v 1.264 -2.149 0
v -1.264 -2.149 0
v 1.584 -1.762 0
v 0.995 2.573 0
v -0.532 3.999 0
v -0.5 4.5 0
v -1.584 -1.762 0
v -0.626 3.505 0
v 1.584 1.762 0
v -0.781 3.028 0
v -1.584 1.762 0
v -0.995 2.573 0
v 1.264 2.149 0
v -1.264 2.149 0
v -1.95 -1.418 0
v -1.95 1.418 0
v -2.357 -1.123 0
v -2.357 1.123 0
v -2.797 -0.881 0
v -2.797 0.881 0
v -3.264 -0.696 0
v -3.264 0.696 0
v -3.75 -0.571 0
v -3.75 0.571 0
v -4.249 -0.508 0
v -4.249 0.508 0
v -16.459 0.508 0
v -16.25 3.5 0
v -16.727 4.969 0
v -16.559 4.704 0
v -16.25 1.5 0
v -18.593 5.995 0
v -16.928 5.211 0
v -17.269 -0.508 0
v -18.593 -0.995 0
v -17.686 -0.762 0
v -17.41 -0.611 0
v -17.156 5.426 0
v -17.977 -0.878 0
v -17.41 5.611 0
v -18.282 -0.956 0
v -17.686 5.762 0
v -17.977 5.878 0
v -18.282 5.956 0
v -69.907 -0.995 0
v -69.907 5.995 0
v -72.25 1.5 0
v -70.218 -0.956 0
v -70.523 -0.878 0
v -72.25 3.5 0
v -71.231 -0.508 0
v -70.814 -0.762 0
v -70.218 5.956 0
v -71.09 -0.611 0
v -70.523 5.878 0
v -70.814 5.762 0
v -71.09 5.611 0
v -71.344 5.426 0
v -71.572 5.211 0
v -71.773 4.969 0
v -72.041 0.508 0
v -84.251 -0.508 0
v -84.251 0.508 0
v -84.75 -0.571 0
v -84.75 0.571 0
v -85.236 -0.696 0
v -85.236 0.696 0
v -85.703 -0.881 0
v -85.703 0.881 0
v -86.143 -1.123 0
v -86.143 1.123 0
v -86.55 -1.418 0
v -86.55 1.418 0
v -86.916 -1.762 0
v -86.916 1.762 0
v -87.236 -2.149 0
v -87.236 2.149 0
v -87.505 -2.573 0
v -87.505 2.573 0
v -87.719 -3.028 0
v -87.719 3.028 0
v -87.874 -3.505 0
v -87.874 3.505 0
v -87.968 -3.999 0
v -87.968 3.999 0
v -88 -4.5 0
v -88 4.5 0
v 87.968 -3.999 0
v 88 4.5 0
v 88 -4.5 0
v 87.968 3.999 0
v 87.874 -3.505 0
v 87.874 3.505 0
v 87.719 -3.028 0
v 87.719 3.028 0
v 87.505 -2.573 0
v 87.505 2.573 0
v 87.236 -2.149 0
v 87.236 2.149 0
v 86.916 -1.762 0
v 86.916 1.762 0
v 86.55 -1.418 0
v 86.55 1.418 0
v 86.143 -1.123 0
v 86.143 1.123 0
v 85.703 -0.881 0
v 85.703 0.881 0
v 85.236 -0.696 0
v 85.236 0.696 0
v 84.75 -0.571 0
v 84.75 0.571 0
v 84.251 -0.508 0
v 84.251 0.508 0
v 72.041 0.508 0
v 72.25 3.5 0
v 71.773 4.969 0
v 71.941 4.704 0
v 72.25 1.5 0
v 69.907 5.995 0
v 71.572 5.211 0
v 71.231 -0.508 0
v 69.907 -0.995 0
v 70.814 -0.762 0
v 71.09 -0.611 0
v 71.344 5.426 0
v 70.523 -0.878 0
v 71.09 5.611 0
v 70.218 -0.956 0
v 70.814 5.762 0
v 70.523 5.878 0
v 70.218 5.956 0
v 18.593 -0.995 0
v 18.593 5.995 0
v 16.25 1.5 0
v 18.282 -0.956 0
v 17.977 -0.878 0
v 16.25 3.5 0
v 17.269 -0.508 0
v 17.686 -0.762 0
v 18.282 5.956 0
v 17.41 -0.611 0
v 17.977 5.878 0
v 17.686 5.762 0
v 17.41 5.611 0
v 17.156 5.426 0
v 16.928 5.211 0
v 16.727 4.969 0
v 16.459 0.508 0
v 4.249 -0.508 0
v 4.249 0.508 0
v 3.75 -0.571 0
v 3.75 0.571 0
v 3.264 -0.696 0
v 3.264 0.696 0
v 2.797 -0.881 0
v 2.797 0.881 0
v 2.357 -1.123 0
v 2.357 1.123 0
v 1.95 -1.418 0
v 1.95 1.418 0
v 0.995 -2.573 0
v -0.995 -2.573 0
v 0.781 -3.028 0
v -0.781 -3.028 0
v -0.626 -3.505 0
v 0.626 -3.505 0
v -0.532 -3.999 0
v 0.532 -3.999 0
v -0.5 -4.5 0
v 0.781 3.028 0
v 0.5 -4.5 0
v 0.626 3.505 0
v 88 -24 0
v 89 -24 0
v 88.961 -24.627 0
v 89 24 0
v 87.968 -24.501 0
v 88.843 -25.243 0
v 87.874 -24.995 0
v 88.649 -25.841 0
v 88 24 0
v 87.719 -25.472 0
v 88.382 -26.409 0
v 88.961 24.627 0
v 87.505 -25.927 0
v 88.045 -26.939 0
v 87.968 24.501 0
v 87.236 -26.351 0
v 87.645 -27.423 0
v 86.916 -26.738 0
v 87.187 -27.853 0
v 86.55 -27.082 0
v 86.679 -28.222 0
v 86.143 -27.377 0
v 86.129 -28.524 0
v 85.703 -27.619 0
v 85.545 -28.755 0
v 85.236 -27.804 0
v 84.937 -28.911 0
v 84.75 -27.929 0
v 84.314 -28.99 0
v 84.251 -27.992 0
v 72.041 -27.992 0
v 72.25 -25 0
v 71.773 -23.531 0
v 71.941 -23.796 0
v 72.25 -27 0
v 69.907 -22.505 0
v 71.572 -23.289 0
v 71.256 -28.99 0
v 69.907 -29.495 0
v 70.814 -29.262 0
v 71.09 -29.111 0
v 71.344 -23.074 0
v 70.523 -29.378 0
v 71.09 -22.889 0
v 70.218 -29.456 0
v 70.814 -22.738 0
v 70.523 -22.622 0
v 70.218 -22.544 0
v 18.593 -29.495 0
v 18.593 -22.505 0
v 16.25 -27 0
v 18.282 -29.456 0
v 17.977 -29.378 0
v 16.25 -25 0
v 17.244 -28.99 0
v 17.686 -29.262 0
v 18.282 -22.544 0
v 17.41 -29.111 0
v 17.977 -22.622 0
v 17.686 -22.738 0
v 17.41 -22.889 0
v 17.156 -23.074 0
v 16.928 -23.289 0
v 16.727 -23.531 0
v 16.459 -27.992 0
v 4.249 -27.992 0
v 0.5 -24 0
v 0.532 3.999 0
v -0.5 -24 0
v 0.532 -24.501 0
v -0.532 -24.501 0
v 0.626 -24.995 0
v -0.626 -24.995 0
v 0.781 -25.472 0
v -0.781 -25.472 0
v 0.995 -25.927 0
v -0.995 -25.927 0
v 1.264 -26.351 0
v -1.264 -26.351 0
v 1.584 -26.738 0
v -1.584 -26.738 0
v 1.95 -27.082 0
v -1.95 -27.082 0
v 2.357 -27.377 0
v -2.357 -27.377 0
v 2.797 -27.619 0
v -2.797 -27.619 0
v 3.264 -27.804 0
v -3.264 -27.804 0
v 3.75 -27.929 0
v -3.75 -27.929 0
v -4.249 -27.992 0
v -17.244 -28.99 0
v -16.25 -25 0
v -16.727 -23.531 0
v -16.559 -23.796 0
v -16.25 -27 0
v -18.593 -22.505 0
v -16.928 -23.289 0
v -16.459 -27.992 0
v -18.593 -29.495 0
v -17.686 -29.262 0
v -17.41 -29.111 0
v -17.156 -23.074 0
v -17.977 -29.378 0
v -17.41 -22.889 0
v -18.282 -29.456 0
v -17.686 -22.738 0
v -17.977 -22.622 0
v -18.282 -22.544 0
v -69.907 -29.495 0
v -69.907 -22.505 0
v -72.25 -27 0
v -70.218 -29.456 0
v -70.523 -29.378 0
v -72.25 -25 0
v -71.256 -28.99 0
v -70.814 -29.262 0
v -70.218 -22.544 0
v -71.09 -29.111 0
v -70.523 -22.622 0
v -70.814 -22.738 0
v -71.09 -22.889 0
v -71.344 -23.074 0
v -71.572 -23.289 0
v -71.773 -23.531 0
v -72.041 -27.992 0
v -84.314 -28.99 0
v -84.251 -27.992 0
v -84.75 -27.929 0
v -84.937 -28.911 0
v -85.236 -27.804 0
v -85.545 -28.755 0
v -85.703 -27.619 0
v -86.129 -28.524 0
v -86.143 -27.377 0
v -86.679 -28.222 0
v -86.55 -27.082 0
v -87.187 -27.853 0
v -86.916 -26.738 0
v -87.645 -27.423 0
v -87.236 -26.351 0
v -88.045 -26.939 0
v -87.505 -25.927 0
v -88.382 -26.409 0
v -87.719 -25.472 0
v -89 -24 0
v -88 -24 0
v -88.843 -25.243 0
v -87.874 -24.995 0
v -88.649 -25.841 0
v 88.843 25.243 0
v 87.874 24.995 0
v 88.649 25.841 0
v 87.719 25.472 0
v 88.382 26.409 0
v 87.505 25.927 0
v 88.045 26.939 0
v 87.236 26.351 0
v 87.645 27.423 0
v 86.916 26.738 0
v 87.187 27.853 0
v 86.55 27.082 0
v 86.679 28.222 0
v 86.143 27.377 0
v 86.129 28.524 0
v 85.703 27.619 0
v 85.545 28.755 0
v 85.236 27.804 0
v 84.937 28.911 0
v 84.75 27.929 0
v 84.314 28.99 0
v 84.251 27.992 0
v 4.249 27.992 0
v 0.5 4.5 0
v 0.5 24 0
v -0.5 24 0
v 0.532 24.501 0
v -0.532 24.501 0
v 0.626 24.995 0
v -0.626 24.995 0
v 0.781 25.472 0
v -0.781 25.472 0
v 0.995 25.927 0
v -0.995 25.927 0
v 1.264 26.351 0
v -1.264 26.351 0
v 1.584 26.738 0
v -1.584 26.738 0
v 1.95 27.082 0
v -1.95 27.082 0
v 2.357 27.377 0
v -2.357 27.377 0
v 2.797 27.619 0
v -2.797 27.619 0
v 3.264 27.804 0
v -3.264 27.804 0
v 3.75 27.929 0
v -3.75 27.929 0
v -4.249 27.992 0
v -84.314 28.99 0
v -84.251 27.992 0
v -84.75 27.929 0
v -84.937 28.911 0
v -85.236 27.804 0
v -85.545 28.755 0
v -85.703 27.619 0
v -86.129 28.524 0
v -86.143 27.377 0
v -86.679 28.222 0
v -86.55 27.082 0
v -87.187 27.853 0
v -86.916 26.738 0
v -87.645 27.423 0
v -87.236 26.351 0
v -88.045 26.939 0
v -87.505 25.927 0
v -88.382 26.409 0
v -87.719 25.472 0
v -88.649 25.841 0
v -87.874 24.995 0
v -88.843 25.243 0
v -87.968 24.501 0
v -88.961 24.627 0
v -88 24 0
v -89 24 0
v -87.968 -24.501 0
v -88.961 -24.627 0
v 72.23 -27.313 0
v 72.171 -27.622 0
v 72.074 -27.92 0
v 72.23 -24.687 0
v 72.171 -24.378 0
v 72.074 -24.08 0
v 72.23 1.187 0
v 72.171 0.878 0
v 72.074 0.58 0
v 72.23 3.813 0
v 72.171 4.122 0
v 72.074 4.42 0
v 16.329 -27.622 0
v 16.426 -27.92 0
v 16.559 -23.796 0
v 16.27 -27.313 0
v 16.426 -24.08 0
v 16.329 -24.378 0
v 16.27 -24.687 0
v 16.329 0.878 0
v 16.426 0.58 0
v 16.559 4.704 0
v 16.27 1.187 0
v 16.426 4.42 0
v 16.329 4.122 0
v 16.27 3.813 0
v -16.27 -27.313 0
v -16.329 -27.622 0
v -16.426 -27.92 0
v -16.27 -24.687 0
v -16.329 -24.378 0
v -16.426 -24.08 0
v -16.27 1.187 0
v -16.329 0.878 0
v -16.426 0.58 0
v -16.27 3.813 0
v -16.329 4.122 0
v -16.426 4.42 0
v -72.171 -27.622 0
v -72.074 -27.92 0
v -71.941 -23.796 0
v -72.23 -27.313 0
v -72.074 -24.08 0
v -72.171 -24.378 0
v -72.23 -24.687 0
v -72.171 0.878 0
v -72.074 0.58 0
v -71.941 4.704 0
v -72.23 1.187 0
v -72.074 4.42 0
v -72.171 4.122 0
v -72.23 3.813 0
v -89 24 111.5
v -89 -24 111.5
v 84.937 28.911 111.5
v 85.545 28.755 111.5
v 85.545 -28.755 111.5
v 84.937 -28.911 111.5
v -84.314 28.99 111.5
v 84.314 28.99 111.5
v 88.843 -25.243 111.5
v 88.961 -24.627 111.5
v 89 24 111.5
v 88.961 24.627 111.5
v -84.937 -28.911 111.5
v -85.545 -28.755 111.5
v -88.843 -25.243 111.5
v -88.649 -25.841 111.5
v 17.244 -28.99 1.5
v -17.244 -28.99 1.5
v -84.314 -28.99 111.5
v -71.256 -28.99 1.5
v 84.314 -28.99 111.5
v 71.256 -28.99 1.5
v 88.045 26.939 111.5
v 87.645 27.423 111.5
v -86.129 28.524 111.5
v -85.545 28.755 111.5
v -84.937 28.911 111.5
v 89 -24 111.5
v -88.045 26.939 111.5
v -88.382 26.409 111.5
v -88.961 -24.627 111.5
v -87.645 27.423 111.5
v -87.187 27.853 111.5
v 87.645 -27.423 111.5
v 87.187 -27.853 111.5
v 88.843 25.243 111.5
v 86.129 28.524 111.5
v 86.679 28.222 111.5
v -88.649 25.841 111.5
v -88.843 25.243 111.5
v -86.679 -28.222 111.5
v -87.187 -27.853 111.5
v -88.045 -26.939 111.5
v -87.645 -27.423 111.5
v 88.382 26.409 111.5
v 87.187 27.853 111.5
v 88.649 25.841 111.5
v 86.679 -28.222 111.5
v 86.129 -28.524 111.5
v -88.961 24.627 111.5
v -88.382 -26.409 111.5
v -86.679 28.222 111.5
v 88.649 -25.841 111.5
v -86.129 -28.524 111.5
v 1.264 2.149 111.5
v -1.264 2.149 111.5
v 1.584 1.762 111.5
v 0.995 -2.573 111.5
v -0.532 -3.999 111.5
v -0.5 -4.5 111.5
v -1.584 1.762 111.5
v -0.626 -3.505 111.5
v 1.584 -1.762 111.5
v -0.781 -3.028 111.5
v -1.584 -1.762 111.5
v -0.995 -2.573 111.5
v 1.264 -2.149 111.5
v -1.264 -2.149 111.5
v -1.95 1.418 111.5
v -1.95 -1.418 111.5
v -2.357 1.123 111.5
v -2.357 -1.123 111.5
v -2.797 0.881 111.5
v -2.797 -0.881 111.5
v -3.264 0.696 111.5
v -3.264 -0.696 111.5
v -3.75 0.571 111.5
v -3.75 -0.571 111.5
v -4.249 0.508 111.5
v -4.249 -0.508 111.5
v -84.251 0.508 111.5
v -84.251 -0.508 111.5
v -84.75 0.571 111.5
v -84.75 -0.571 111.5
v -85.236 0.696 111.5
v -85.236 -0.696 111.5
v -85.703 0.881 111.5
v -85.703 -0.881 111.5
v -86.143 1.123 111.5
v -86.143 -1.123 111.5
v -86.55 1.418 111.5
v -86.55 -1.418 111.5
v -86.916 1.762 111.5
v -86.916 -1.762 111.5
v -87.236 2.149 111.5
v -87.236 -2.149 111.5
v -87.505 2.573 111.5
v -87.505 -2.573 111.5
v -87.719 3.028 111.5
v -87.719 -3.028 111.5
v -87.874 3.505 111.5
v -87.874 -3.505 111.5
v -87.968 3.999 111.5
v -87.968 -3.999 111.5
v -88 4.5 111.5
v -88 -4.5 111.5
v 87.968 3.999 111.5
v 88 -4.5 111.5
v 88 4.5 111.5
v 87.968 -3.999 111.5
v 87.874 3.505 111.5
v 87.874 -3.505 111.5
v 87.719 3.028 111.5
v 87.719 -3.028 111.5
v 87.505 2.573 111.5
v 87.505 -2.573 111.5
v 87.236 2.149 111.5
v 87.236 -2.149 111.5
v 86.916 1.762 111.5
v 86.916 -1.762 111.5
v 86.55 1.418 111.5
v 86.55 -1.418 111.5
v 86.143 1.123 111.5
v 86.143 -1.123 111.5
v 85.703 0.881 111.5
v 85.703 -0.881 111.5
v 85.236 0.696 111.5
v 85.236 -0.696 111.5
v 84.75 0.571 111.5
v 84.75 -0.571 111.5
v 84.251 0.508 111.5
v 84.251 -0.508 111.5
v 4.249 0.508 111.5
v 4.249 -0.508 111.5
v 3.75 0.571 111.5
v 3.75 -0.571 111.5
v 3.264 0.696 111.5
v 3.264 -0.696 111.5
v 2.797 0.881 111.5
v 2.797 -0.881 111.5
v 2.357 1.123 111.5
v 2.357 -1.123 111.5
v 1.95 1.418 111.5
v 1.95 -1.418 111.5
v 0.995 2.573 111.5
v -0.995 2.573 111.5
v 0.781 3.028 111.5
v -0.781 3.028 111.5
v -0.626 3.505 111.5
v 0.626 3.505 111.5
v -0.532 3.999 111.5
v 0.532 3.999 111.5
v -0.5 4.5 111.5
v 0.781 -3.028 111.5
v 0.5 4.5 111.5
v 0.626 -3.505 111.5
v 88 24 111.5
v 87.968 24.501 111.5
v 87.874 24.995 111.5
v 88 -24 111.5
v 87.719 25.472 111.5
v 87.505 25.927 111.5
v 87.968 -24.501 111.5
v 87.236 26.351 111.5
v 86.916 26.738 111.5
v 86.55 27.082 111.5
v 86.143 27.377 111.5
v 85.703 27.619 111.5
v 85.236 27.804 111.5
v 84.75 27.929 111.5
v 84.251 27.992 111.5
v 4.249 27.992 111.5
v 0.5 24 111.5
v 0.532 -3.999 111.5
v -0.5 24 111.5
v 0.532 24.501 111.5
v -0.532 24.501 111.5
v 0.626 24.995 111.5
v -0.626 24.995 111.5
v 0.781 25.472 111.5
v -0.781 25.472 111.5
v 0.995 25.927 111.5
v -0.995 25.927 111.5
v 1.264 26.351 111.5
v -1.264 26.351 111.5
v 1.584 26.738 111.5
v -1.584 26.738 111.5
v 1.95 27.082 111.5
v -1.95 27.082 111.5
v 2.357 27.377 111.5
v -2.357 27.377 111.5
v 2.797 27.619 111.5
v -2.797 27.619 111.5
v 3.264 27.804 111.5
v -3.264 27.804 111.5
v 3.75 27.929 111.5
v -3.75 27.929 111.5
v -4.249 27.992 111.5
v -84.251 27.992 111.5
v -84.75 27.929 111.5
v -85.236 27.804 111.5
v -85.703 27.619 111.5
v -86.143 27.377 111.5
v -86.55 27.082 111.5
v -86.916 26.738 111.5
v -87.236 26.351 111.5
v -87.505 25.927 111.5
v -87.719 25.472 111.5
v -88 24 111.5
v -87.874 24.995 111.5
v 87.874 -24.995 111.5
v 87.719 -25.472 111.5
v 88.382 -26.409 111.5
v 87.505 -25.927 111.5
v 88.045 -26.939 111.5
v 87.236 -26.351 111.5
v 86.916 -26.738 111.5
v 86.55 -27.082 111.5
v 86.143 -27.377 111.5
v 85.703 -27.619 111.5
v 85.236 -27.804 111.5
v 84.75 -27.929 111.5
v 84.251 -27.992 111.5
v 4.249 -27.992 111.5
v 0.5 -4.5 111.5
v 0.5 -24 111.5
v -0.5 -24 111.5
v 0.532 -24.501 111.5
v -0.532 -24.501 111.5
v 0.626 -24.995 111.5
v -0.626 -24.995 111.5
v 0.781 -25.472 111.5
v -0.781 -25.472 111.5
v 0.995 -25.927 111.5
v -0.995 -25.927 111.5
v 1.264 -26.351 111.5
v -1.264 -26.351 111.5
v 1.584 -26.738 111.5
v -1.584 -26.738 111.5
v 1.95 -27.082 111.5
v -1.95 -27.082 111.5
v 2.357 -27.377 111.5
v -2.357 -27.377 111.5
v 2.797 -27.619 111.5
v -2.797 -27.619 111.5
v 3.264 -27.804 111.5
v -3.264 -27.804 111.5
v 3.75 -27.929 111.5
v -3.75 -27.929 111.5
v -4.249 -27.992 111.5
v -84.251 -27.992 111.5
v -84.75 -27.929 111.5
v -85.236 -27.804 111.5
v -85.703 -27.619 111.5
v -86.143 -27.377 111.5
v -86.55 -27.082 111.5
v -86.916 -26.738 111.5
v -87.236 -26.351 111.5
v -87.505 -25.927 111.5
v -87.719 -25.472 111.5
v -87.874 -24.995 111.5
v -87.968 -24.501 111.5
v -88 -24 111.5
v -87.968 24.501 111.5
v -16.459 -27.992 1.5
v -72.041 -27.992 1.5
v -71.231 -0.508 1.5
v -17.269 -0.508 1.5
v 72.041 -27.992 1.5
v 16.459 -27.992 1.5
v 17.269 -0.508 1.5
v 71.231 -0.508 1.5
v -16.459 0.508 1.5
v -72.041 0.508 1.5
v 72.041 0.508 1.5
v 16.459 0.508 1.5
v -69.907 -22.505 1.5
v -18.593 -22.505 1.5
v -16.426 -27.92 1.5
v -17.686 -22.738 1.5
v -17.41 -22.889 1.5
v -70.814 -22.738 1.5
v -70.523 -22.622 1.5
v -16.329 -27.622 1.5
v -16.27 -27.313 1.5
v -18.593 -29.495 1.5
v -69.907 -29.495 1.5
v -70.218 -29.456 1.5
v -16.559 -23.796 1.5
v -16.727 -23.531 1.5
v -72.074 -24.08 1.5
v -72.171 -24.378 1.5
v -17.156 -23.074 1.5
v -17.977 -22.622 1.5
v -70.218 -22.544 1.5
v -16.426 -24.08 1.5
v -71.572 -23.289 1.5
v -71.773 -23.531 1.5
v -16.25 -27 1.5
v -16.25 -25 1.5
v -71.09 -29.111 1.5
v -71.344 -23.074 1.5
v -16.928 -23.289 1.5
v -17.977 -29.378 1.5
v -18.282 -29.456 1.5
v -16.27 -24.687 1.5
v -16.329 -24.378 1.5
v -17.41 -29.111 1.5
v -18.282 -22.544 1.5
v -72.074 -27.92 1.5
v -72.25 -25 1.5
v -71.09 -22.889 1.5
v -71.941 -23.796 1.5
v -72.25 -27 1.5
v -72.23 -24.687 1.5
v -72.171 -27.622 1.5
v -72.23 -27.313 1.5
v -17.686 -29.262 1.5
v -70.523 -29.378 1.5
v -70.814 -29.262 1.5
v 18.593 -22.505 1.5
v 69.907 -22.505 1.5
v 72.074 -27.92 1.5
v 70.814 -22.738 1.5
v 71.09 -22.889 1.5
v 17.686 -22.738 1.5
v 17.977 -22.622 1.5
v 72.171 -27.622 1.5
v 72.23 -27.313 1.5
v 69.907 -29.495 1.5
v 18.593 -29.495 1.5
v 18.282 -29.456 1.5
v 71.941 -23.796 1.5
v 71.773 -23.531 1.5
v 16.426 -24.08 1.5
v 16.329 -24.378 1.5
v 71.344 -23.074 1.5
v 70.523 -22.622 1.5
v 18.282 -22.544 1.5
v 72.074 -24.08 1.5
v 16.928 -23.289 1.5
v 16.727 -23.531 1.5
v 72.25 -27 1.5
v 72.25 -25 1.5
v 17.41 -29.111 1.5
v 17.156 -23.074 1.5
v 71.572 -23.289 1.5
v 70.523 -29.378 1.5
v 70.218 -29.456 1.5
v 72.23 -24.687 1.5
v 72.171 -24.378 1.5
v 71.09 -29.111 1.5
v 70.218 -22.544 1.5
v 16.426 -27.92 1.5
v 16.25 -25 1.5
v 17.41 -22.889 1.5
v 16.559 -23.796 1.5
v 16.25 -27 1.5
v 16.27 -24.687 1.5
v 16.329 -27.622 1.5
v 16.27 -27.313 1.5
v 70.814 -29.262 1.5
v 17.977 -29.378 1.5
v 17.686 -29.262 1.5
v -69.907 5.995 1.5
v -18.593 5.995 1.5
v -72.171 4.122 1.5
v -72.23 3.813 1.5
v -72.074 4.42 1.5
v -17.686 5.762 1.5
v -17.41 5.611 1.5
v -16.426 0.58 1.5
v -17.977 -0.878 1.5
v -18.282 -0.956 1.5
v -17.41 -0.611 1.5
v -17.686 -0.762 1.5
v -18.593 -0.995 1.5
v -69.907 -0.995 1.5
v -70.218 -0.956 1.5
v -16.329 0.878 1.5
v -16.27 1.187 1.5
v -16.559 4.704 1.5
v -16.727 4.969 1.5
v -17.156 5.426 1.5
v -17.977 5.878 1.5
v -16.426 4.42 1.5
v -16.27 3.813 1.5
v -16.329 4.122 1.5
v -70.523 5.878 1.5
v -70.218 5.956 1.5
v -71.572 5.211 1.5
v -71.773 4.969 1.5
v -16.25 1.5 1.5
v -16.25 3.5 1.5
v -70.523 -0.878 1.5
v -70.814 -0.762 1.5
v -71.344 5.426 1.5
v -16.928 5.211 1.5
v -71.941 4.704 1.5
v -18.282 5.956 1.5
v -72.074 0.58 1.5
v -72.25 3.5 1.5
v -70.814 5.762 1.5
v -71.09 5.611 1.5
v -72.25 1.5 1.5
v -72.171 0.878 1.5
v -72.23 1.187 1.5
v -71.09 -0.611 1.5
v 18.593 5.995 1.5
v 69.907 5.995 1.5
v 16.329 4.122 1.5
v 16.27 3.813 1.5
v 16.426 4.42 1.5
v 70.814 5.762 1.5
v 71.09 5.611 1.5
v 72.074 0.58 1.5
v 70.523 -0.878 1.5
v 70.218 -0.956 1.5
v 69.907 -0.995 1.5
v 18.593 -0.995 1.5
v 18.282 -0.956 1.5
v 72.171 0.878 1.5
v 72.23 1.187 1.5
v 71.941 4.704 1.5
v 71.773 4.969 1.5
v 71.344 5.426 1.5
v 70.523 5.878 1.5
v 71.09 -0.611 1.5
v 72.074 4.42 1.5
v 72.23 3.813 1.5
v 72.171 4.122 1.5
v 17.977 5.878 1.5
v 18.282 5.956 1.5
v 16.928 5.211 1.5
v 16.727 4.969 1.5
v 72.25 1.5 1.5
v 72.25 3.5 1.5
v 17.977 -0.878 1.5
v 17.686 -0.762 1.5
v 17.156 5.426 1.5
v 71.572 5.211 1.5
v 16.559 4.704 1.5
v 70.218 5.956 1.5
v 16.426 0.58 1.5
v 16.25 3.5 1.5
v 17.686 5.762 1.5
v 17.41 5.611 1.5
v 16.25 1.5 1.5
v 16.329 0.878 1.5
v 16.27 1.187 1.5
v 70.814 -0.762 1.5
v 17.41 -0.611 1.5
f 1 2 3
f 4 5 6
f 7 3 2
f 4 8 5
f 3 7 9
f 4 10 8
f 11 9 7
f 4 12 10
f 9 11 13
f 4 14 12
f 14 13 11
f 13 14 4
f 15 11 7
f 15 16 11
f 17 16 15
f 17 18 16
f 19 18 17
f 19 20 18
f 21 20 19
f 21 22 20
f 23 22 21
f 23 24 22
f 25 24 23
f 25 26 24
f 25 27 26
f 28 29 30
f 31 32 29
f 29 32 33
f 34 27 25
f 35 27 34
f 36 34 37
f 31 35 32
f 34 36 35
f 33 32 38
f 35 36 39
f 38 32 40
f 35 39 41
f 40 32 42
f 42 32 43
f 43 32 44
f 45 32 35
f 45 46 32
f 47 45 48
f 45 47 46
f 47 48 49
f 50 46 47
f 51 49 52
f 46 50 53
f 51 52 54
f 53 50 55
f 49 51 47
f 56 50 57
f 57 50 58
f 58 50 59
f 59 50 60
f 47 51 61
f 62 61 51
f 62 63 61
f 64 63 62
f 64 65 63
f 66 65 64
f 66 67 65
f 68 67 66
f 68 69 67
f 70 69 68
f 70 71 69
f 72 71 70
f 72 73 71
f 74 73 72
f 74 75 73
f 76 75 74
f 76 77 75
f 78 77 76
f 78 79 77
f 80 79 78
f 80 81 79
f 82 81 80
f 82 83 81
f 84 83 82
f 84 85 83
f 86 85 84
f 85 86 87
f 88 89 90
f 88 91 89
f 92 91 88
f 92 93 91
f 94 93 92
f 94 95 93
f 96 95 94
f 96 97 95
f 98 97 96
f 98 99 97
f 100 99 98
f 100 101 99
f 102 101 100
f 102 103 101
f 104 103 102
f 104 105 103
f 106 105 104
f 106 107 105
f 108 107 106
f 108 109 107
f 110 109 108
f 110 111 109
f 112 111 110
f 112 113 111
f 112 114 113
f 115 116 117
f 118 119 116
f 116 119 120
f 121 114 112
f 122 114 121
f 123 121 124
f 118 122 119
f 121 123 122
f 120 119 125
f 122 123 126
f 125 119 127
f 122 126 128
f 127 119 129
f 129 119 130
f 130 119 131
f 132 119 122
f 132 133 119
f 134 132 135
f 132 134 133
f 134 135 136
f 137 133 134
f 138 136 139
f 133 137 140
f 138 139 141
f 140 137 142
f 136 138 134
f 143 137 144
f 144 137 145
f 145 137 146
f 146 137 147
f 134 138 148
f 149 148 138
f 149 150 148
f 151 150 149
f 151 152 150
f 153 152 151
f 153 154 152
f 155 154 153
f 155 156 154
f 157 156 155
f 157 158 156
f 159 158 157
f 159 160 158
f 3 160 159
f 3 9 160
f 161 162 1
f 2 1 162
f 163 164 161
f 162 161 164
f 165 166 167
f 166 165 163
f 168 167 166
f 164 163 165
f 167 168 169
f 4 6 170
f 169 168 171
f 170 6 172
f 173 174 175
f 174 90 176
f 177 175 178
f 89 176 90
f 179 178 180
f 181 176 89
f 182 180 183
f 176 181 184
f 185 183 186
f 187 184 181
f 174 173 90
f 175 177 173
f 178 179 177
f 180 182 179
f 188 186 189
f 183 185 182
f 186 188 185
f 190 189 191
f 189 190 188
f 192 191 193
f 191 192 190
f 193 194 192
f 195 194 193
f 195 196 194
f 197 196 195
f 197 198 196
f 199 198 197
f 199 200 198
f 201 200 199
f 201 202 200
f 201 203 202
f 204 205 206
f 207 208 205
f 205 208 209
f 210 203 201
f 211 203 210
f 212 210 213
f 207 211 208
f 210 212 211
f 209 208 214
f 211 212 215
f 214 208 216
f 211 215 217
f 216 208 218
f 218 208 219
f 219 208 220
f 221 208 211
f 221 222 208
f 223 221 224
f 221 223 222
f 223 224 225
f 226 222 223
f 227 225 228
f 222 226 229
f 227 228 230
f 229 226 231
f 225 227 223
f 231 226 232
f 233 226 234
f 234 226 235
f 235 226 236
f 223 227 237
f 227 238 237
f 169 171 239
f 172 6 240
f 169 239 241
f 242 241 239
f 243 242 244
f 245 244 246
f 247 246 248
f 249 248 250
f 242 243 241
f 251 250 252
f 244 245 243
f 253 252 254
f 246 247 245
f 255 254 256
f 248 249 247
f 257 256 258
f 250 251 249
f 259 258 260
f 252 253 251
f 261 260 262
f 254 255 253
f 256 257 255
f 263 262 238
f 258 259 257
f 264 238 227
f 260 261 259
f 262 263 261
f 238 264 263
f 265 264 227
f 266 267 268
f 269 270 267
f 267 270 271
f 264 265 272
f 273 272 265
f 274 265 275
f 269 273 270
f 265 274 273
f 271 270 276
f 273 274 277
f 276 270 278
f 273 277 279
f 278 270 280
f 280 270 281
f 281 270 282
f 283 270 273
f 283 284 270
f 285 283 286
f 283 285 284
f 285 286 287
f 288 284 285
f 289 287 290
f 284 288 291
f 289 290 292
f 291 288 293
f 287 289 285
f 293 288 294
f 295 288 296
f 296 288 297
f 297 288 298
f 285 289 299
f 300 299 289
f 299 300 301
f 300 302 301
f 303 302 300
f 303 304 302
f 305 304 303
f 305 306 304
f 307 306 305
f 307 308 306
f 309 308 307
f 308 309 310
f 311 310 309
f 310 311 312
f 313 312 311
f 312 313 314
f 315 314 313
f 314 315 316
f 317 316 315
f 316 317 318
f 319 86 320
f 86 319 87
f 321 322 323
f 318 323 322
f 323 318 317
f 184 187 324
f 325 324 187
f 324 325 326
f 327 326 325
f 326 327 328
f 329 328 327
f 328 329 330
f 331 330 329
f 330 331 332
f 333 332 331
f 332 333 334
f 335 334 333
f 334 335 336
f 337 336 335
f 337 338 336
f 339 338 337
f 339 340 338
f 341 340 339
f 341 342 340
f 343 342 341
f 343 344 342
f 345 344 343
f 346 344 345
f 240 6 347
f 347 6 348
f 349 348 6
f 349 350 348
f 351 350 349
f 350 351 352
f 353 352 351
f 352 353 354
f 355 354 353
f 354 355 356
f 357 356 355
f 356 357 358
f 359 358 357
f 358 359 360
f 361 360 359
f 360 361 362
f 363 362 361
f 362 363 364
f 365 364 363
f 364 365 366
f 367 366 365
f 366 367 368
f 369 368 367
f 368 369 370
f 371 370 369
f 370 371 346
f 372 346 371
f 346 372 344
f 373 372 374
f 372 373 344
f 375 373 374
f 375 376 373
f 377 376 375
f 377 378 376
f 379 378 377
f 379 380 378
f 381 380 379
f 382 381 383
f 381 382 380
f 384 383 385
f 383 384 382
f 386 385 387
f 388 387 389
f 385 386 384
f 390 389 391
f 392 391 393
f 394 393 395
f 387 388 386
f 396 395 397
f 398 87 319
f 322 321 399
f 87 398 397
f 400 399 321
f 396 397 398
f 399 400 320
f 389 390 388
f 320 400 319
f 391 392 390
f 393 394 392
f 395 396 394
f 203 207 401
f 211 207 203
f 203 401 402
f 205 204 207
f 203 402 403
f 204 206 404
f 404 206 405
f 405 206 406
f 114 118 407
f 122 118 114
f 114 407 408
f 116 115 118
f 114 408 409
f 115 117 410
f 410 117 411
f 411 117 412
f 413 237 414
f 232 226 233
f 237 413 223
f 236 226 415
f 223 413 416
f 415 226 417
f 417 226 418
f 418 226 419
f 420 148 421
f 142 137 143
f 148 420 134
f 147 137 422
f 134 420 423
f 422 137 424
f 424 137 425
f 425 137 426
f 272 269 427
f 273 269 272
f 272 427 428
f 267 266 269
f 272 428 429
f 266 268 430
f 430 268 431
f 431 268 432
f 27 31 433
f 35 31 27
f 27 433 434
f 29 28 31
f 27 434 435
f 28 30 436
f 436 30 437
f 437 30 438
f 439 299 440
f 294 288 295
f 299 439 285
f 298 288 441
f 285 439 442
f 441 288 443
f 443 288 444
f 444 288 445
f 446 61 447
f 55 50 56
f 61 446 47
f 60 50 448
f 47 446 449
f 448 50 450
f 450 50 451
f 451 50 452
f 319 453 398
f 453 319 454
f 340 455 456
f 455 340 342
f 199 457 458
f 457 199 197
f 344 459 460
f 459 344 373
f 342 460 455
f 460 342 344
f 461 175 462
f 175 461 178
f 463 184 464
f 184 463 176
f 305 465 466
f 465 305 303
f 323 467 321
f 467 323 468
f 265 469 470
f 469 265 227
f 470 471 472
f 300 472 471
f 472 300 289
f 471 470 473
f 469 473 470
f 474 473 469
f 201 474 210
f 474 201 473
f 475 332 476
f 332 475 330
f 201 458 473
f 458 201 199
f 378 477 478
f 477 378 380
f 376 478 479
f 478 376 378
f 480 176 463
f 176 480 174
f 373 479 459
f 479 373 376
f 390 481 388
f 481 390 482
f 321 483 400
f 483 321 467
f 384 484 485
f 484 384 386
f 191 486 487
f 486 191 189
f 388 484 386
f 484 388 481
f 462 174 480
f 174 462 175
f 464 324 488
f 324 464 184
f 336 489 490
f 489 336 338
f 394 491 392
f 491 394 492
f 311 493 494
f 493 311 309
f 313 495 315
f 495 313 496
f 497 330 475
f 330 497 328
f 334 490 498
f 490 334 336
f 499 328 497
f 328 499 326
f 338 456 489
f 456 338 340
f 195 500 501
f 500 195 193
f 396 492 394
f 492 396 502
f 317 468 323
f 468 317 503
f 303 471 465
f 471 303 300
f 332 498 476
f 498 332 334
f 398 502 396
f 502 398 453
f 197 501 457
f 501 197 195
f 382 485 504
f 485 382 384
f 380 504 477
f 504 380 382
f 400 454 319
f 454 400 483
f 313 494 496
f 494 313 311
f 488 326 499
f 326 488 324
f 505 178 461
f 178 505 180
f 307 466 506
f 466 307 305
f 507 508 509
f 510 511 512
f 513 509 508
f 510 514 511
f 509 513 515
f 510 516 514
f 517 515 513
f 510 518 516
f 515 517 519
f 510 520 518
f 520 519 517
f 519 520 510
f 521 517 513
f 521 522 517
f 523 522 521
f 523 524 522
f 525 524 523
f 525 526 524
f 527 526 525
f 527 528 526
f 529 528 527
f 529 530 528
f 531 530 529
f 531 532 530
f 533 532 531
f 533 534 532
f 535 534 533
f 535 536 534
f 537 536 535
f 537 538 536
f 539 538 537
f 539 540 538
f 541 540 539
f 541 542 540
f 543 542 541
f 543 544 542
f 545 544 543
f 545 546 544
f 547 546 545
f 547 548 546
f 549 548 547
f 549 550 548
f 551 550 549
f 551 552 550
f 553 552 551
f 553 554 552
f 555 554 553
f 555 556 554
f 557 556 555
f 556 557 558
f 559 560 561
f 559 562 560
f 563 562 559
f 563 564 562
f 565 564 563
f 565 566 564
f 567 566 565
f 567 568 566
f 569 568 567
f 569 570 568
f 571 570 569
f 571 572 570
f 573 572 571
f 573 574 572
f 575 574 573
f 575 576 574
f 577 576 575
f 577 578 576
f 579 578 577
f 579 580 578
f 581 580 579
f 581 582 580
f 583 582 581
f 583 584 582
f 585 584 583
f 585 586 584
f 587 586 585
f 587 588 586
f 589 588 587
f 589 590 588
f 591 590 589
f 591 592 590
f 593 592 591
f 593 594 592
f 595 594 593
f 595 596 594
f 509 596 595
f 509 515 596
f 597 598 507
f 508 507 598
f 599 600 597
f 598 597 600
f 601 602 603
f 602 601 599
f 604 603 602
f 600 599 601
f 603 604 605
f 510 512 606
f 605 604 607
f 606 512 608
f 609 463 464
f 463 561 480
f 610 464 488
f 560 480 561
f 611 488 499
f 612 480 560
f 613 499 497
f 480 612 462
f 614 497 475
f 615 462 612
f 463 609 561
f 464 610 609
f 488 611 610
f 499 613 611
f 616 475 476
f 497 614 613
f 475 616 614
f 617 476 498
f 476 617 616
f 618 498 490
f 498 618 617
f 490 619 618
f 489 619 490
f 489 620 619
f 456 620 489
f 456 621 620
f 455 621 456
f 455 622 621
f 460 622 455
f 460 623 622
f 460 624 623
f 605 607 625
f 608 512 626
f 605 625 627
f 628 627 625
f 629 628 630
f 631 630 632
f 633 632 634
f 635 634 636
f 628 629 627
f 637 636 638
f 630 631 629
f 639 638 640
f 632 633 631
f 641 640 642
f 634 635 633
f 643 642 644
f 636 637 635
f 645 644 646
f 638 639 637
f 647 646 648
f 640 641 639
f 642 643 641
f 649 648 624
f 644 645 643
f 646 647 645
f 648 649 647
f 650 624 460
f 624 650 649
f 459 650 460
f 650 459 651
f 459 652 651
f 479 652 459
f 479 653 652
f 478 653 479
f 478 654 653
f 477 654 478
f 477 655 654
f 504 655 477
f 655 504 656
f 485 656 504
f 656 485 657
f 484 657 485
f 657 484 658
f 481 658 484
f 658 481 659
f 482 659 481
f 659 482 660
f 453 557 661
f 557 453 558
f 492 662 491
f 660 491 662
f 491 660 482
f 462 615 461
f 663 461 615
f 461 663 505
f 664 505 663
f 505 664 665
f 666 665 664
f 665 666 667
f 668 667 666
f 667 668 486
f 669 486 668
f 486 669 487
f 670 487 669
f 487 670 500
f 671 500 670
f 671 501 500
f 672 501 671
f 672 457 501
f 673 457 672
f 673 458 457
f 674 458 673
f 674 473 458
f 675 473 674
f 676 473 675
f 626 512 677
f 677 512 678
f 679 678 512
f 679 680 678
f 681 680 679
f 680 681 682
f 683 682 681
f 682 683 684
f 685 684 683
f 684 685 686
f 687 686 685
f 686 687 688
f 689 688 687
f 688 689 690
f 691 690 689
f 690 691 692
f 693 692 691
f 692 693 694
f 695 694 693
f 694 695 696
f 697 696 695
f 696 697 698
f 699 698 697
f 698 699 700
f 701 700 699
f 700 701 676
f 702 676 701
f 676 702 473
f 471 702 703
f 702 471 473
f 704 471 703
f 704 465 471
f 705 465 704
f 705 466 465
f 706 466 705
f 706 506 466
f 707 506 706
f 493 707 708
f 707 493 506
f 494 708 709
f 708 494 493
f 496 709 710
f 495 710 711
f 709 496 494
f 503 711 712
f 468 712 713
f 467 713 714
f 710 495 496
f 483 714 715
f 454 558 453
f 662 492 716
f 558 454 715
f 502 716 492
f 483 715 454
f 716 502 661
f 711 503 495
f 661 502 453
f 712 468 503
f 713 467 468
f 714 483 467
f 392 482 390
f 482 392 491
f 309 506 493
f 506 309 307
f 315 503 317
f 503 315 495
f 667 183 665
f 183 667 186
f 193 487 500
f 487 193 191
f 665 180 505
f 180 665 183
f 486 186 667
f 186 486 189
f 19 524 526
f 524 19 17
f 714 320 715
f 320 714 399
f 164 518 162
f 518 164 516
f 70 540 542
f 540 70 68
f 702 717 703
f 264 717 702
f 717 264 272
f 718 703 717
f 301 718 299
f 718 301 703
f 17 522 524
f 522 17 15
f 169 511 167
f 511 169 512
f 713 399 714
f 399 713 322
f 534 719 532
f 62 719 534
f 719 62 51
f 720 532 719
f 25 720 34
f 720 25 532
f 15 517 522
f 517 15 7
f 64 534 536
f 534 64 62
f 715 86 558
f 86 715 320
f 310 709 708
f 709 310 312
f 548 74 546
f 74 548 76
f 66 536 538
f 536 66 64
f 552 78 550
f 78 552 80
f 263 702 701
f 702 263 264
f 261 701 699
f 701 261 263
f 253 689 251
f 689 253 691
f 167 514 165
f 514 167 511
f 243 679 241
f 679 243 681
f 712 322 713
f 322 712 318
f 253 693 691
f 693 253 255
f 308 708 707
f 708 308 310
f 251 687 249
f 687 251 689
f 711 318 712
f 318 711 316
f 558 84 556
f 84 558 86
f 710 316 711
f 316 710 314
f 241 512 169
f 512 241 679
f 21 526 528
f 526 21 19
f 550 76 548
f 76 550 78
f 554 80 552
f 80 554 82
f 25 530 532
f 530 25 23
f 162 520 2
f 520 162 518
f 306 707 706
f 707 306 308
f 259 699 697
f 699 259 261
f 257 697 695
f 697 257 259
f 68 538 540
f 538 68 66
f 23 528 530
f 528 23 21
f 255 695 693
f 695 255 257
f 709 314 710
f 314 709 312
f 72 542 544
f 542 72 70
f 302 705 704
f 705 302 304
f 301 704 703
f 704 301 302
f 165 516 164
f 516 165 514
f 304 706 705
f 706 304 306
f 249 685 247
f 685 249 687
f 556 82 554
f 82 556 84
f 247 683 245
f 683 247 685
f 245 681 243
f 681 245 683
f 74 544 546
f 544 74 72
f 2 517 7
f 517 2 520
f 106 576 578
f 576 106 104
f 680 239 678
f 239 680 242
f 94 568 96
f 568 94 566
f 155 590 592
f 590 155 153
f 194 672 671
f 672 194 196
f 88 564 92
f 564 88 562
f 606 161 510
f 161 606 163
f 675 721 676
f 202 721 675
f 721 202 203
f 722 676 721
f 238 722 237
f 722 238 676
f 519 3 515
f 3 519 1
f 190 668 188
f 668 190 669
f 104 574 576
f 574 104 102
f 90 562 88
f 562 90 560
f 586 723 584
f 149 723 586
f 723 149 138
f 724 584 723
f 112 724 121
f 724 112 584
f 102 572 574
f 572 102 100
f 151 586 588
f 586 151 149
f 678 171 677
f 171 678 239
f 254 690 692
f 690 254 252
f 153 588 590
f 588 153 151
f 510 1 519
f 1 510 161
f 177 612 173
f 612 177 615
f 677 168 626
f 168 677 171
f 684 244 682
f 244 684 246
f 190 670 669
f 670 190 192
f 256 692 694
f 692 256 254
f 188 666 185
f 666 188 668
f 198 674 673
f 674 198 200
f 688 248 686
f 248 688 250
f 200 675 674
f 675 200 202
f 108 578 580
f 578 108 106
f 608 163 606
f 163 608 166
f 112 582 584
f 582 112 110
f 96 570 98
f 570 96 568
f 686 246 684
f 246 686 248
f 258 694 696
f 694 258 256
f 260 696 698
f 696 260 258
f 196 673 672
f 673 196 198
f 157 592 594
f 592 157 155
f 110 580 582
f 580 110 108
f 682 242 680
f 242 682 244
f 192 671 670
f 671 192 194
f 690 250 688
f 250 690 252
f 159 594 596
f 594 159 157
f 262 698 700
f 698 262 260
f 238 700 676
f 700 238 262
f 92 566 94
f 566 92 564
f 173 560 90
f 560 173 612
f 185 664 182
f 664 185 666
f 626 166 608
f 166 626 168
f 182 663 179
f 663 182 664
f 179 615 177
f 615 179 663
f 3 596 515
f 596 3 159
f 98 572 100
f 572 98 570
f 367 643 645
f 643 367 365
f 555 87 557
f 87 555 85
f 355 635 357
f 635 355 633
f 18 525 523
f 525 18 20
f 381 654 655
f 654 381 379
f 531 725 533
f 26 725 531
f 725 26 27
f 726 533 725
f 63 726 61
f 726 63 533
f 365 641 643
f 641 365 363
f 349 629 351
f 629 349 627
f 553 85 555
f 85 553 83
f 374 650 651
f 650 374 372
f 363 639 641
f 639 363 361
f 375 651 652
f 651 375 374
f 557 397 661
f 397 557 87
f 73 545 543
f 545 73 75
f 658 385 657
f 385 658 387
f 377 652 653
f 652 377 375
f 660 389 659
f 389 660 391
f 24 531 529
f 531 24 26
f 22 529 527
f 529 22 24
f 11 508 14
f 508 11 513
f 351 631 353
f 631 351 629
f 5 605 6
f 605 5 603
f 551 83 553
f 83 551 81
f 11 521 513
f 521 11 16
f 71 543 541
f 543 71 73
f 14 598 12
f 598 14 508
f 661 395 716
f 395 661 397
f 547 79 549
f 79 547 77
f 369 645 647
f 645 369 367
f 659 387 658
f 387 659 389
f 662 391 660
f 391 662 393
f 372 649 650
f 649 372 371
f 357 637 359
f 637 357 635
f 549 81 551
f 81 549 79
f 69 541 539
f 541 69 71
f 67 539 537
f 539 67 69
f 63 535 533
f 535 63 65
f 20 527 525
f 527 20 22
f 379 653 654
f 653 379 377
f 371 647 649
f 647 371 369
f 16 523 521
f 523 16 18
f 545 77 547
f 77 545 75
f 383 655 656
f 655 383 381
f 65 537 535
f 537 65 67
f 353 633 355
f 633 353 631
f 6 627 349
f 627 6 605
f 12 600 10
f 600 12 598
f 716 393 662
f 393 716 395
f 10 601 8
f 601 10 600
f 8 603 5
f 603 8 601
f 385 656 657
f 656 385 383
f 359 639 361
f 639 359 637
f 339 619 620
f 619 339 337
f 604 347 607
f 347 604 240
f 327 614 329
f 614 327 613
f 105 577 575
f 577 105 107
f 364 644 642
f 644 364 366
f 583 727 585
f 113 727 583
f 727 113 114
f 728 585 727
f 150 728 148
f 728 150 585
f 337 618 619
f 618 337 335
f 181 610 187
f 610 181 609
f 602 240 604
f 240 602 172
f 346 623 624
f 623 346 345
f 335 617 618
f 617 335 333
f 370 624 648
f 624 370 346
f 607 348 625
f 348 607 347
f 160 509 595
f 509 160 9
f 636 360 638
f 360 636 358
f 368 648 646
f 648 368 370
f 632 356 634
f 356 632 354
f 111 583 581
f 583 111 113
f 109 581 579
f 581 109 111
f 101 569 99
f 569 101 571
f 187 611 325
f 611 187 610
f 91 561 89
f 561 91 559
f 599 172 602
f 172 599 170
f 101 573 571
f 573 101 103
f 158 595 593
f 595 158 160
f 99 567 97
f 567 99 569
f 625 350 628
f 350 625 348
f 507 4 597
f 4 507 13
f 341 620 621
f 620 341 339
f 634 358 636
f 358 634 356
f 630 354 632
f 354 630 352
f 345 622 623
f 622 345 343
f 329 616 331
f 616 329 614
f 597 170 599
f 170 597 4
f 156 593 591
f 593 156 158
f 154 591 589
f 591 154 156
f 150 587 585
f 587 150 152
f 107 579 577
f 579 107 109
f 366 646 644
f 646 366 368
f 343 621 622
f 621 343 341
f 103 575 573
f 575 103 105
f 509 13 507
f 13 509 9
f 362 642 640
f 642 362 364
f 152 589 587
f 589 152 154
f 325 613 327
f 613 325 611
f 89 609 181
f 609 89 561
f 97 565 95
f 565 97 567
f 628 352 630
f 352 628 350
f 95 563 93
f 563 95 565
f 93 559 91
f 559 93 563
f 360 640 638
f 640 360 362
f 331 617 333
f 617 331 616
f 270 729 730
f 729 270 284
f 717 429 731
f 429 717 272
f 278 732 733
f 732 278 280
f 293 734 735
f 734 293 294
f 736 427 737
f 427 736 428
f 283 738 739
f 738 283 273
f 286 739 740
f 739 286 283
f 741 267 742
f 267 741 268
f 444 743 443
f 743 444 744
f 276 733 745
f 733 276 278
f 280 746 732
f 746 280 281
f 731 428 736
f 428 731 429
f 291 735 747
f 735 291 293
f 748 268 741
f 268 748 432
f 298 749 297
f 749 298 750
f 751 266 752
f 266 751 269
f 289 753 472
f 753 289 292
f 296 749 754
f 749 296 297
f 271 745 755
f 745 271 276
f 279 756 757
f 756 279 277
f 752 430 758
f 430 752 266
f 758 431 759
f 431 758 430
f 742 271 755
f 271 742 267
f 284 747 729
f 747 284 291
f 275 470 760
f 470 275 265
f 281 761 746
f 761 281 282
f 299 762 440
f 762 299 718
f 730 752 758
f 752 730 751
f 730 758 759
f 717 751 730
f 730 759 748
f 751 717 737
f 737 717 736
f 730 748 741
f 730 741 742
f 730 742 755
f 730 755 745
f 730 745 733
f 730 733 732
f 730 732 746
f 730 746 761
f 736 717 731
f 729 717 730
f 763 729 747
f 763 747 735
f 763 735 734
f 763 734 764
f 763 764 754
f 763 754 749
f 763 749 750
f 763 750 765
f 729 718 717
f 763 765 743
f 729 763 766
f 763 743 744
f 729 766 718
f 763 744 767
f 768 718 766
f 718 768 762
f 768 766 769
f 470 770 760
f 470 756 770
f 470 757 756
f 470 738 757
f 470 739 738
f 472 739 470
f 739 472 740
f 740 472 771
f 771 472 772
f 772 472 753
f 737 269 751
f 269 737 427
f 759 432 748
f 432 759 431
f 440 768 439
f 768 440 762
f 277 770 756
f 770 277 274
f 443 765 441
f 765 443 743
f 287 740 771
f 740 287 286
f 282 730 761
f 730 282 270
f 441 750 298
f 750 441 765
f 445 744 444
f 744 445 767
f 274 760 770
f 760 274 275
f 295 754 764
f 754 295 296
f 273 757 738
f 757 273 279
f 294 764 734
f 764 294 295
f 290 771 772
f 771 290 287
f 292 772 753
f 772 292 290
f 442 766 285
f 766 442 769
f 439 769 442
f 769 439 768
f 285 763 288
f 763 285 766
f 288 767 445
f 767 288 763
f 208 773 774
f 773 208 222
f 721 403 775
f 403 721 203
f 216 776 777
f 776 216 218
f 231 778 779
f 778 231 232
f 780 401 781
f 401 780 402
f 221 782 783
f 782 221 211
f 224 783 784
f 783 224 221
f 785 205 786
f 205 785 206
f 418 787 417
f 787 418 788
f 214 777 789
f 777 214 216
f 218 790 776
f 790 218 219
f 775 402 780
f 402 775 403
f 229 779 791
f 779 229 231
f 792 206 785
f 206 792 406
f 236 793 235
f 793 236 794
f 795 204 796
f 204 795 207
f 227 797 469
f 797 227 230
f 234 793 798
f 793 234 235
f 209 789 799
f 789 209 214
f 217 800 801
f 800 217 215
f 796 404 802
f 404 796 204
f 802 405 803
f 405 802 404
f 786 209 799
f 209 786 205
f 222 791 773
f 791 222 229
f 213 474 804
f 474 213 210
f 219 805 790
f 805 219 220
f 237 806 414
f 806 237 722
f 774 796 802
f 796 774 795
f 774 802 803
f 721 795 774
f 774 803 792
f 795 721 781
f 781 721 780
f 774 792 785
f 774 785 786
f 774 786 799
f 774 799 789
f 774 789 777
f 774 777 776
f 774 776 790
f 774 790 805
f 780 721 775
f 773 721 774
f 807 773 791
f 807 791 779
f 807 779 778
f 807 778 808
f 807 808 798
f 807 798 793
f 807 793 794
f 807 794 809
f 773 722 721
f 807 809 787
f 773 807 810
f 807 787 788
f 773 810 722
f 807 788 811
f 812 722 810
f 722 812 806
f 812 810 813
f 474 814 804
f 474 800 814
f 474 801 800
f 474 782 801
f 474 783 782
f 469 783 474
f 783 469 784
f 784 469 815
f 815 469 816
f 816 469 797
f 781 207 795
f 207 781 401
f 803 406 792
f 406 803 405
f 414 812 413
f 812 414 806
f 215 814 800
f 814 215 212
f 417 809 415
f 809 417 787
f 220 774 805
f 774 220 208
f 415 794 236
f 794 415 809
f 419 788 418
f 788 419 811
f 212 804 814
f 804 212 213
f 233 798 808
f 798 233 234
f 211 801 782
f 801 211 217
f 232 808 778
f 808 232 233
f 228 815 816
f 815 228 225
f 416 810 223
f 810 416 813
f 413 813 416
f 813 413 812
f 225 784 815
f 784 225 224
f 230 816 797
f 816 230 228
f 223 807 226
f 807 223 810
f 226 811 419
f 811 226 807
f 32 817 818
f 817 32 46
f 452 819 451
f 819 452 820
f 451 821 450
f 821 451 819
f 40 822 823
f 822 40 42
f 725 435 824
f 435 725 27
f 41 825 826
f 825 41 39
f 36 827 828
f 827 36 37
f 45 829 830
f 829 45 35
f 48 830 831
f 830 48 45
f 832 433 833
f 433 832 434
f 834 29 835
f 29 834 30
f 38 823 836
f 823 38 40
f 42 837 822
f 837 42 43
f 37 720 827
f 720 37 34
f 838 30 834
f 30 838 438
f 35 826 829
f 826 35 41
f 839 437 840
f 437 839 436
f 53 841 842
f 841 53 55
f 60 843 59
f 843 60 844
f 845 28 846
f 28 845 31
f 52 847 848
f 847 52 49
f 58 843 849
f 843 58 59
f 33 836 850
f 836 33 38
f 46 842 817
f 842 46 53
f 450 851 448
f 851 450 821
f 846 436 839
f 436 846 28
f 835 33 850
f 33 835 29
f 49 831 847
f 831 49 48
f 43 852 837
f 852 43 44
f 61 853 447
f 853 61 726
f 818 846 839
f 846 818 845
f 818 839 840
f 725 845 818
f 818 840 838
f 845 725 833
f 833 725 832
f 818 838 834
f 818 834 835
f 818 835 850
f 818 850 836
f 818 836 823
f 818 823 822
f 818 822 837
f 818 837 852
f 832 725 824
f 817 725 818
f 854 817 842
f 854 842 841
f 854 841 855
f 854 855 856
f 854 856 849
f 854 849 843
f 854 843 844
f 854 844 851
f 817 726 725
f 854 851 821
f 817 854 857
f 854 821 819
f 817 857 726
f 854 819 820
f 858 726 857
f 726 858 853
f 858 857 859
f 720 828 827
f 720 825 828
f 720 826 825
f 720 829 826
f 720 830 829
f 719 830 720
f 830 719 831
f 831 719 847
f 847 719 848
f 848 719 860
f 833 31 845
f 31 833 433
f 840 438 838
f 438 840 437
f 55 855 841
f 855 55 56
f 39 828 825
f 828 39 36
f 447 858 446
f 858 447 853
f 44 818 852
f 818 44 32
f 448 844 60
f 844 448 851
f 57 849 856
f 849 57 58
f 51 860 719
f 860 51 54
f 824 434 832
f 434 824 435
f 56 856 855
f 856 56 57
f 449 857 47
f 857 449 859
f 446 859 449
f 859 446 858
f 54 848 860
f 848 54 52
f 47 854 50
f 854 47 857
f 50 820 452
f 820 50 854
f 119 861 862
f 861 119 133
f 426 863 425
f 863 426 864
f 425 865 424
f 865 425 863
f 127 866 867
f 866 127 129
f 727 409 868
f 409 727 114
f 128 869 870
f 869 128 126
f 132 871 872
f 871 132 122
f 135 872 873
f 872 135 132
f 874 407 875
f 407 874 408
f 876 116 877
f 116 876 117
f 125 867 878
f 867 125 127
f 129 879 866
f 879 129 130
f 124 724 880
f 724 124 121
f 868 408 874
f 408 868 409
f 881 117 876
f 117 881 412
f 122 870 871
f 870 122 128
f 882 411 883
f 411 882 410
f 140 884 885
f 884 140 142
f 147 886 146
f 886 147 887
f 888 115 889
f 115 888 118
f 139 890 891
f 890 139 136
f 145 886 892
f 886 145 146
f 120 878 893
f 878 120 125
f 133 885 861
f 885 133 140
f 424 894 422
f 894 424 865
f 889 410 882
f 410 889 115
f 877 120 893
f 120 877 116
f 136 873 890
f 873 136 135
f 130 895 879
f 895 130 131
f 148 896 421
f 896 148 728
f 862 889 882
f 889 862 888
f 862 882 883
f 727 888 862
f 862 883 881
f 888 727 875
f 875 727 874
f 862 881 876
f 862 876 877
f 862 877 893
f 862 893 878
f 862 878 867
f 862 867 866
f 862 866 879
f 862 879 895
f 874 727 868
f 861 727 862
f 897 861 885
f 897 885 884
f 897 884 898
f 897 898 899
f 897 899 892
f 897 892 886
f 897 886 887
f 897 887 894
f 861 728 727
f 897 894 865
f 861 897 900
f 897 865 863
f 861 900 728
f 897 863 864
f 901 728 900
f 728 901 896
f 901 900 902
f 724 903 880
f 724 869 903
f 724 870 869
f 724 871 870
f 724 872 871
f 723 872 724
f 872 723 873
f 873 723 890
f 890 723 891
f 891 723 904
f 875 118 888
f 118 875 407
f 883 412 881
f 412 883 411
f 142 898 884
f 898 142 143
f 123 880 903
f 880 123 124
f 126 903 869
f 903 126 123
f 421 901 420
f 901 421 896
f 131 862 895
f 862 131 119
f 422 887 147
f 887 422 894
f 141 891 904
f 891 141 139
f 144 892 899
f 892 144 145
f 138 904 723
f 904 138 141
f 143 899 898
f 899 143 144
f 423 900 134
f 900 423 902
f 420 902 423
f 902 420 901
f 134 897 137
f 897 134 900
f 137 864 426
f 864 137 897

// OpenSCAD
$fn = 50;

union() {
	difference() {
		union() {
			translate(v = [0, 0, 3]) {
				rotate(a = [0, 0, 0]) {
					difference() {
						union() {
							#translate(v = [0, 0, -3.0]) {
								cylinder(h = 3, r = 1.5);
							}
							#translate(v = [0, 0, -1.9]) {
								cylinder(h = 1.9, r1 = 1.8, r2 = 3.6);
							}
							#translate(v = [0, 0, -3.0]) {
								cylinder(h = 3, r = 1.8);
							}
							#translate(v = [0, 0, -3.0]) {
								cylinder(h = 3, r = 1.5);
							}
						}
						union();
					}
				}
			}
			hull() {
				translate(v = [-84.0, 24.0, 0]) {
					cylinder(h = 111.5, r = 5);
				}
				translate(v = [84.0, 24.0, 0]) {
					cylinder(h = 111.5, r = 5);
				}
				translate(v = [-84.0, -24.0, 0]) {
					cylinder(h = 111.5, r = 5);
				}
				translate(v = [84.0, -24.0, 0]) {
					cylinder(h = 111.5, r = 5);
				}
			}
		}
		union() {
			#translate(v = [-44.25, -14.25, 0]) {
				#hull() {
					translate(v = [-39.75, 9.75, 0]) {
						cylinder(h = 111.5, r = 4);
					}
					translate(v = [39.75, 9.75, 0]) {
						cylinder(h = 111.5, r = 4);
					}
					translate(v = [-39.75, -9.75, 0]) {
						cylinder(h = 111.5, r = 4);
					}
					translate(v = [39.75, -9.75, 0]) {
						cylinder(h = 111.5, r = 4);
					}
				}
			}
			#translate(v = [44.25, -14.25, 0]) {
				#hull() {
					translate(v = [-39.75, 9.75, 0]) {
						cylinder(h = 111.5, r = 4);
					}
					translate(v = [39.75, 9.75, 0]) {
						cylinder(h = 111.5, r = 4);
					}
					translate(v = [-39.75, -9.75, 0]) {
						cylinder(h = 111.5, r = 4);
					}
					translate(v = [39.75, -9.75, 0]) {
						cylinder(h = 111.5, r = 4);
					}
				}
			}
			#translate(v = [-44.25, 14.25, 0]) {
				#hull() {
					translate(v = [-39.75, 9.75, 0]) {
						cylinder(h = 111.5, r = 4);
					}
					translate(v = [39.75, 9.75, 0]) {
						cylinder(h = 111.5, r = 4);
					}
					translate(v = [-39.75, -9.75, 0]) {
						cylinder(h = 111.5, r = 4);
					}
					translate(v = [39.75, -9.75, 0]) {
						cylinder(h = 111.5, r = 4);
					}
				}
			}
			#translate(v = [44.25, 14.25, 0]) {
				#hull() {
					translate(v = [-39.75, 9.75, 0]) {
						cylinder(h = 111.5, r = 4);
					}
					translate(v = [39.75, 9.75, 0]) {
						cylinder(h = 111.5, r = 4);
					}
					translate(v = [-39.75, -9.75, 0]) {
						cylinder(h = 111.5, r = 4);
					}
					translate(v = [39.75, -9.75, 0]) {
						cylinder(h = 111.5, r = 4);
					}
				}
			}
		}
	}
	union() {
		#translate(v = [-44.25, -26.0, 0]) {
			#hull() {
				translate(v = [-25.5, 1.0, 0]) {
					cylinder(h = 1.5, r = 2.5);
				}
				translate(v = [25.5, 1.0, 0]) {
					cylinder(h = 1.5, r = 2.5);
				}
				translate(v = [-25.5, -1.0, 0]) {
					cylinder(h = 1.5, r = 2.5);
				}
				translate(v = [25.5, -1.0, 0]) {
					cylinder(h = 1.5, r = 2.5);
				}
			}
		}
		#translate(v = [44.25, -26.0, 0]) {
			#hull() {
				translate(v = [-25.5, 1.0, 0]) {
					cylinder(h = 1.5, r = 2.5);
				}
				translate(v = [25.5, 1.0, 0]) {
					cylinder(h = 1.5, r = 2.5);
				}
				translate(v = [-25.5, -1.0, 0]) {
					cylinder(h = 1.5, r = 2.5);
				}
				translate(v = [25.5, -1.0, 0]) {
					cylinder(h = 1.5, r = 2.5);
				}
			}
		}
		#translate(v = [-44.25, 2.5, 0]) {
			#hull() {
				translate(v = [-25.5, 1.0, 0]) {
					cylinder(h = 1.5, r = 2.5);
				}
				translate(v = [25.5, 1.0, 0]) {
					cylinder(h = 1.5, r = 2.5);
				}
				translate(v = [-25.5, -1.0, 0]) {
					cylinder(h = 1.5, r = 2.5);
				}
				translate(v = [25.5, -1.0, 0]) {
					cylinder(h = 1.5, r = 2.5);
				}
			}
		}
		#translate(v = [44.25, 2.5, 0]) {
			#hull() {
				translate(v = [-25.5, 1.0, 0]) {
					cylinder(h = 1.5, r = 2.5);
				}
				translate(v = [25.5, 1.0, 0]) {
					cylinder(h = 1.5, r = 2.5);
				}
				translate(v = [-25.5, -1.0, 0]) {
					cylinder(h = 1.5, r = 2.5);
				}
				translate(v = [25.5, -1.0, 0]) {
					cylinder(h = 1.5, r = 2.5);
				}
			}
		}
	}
}
